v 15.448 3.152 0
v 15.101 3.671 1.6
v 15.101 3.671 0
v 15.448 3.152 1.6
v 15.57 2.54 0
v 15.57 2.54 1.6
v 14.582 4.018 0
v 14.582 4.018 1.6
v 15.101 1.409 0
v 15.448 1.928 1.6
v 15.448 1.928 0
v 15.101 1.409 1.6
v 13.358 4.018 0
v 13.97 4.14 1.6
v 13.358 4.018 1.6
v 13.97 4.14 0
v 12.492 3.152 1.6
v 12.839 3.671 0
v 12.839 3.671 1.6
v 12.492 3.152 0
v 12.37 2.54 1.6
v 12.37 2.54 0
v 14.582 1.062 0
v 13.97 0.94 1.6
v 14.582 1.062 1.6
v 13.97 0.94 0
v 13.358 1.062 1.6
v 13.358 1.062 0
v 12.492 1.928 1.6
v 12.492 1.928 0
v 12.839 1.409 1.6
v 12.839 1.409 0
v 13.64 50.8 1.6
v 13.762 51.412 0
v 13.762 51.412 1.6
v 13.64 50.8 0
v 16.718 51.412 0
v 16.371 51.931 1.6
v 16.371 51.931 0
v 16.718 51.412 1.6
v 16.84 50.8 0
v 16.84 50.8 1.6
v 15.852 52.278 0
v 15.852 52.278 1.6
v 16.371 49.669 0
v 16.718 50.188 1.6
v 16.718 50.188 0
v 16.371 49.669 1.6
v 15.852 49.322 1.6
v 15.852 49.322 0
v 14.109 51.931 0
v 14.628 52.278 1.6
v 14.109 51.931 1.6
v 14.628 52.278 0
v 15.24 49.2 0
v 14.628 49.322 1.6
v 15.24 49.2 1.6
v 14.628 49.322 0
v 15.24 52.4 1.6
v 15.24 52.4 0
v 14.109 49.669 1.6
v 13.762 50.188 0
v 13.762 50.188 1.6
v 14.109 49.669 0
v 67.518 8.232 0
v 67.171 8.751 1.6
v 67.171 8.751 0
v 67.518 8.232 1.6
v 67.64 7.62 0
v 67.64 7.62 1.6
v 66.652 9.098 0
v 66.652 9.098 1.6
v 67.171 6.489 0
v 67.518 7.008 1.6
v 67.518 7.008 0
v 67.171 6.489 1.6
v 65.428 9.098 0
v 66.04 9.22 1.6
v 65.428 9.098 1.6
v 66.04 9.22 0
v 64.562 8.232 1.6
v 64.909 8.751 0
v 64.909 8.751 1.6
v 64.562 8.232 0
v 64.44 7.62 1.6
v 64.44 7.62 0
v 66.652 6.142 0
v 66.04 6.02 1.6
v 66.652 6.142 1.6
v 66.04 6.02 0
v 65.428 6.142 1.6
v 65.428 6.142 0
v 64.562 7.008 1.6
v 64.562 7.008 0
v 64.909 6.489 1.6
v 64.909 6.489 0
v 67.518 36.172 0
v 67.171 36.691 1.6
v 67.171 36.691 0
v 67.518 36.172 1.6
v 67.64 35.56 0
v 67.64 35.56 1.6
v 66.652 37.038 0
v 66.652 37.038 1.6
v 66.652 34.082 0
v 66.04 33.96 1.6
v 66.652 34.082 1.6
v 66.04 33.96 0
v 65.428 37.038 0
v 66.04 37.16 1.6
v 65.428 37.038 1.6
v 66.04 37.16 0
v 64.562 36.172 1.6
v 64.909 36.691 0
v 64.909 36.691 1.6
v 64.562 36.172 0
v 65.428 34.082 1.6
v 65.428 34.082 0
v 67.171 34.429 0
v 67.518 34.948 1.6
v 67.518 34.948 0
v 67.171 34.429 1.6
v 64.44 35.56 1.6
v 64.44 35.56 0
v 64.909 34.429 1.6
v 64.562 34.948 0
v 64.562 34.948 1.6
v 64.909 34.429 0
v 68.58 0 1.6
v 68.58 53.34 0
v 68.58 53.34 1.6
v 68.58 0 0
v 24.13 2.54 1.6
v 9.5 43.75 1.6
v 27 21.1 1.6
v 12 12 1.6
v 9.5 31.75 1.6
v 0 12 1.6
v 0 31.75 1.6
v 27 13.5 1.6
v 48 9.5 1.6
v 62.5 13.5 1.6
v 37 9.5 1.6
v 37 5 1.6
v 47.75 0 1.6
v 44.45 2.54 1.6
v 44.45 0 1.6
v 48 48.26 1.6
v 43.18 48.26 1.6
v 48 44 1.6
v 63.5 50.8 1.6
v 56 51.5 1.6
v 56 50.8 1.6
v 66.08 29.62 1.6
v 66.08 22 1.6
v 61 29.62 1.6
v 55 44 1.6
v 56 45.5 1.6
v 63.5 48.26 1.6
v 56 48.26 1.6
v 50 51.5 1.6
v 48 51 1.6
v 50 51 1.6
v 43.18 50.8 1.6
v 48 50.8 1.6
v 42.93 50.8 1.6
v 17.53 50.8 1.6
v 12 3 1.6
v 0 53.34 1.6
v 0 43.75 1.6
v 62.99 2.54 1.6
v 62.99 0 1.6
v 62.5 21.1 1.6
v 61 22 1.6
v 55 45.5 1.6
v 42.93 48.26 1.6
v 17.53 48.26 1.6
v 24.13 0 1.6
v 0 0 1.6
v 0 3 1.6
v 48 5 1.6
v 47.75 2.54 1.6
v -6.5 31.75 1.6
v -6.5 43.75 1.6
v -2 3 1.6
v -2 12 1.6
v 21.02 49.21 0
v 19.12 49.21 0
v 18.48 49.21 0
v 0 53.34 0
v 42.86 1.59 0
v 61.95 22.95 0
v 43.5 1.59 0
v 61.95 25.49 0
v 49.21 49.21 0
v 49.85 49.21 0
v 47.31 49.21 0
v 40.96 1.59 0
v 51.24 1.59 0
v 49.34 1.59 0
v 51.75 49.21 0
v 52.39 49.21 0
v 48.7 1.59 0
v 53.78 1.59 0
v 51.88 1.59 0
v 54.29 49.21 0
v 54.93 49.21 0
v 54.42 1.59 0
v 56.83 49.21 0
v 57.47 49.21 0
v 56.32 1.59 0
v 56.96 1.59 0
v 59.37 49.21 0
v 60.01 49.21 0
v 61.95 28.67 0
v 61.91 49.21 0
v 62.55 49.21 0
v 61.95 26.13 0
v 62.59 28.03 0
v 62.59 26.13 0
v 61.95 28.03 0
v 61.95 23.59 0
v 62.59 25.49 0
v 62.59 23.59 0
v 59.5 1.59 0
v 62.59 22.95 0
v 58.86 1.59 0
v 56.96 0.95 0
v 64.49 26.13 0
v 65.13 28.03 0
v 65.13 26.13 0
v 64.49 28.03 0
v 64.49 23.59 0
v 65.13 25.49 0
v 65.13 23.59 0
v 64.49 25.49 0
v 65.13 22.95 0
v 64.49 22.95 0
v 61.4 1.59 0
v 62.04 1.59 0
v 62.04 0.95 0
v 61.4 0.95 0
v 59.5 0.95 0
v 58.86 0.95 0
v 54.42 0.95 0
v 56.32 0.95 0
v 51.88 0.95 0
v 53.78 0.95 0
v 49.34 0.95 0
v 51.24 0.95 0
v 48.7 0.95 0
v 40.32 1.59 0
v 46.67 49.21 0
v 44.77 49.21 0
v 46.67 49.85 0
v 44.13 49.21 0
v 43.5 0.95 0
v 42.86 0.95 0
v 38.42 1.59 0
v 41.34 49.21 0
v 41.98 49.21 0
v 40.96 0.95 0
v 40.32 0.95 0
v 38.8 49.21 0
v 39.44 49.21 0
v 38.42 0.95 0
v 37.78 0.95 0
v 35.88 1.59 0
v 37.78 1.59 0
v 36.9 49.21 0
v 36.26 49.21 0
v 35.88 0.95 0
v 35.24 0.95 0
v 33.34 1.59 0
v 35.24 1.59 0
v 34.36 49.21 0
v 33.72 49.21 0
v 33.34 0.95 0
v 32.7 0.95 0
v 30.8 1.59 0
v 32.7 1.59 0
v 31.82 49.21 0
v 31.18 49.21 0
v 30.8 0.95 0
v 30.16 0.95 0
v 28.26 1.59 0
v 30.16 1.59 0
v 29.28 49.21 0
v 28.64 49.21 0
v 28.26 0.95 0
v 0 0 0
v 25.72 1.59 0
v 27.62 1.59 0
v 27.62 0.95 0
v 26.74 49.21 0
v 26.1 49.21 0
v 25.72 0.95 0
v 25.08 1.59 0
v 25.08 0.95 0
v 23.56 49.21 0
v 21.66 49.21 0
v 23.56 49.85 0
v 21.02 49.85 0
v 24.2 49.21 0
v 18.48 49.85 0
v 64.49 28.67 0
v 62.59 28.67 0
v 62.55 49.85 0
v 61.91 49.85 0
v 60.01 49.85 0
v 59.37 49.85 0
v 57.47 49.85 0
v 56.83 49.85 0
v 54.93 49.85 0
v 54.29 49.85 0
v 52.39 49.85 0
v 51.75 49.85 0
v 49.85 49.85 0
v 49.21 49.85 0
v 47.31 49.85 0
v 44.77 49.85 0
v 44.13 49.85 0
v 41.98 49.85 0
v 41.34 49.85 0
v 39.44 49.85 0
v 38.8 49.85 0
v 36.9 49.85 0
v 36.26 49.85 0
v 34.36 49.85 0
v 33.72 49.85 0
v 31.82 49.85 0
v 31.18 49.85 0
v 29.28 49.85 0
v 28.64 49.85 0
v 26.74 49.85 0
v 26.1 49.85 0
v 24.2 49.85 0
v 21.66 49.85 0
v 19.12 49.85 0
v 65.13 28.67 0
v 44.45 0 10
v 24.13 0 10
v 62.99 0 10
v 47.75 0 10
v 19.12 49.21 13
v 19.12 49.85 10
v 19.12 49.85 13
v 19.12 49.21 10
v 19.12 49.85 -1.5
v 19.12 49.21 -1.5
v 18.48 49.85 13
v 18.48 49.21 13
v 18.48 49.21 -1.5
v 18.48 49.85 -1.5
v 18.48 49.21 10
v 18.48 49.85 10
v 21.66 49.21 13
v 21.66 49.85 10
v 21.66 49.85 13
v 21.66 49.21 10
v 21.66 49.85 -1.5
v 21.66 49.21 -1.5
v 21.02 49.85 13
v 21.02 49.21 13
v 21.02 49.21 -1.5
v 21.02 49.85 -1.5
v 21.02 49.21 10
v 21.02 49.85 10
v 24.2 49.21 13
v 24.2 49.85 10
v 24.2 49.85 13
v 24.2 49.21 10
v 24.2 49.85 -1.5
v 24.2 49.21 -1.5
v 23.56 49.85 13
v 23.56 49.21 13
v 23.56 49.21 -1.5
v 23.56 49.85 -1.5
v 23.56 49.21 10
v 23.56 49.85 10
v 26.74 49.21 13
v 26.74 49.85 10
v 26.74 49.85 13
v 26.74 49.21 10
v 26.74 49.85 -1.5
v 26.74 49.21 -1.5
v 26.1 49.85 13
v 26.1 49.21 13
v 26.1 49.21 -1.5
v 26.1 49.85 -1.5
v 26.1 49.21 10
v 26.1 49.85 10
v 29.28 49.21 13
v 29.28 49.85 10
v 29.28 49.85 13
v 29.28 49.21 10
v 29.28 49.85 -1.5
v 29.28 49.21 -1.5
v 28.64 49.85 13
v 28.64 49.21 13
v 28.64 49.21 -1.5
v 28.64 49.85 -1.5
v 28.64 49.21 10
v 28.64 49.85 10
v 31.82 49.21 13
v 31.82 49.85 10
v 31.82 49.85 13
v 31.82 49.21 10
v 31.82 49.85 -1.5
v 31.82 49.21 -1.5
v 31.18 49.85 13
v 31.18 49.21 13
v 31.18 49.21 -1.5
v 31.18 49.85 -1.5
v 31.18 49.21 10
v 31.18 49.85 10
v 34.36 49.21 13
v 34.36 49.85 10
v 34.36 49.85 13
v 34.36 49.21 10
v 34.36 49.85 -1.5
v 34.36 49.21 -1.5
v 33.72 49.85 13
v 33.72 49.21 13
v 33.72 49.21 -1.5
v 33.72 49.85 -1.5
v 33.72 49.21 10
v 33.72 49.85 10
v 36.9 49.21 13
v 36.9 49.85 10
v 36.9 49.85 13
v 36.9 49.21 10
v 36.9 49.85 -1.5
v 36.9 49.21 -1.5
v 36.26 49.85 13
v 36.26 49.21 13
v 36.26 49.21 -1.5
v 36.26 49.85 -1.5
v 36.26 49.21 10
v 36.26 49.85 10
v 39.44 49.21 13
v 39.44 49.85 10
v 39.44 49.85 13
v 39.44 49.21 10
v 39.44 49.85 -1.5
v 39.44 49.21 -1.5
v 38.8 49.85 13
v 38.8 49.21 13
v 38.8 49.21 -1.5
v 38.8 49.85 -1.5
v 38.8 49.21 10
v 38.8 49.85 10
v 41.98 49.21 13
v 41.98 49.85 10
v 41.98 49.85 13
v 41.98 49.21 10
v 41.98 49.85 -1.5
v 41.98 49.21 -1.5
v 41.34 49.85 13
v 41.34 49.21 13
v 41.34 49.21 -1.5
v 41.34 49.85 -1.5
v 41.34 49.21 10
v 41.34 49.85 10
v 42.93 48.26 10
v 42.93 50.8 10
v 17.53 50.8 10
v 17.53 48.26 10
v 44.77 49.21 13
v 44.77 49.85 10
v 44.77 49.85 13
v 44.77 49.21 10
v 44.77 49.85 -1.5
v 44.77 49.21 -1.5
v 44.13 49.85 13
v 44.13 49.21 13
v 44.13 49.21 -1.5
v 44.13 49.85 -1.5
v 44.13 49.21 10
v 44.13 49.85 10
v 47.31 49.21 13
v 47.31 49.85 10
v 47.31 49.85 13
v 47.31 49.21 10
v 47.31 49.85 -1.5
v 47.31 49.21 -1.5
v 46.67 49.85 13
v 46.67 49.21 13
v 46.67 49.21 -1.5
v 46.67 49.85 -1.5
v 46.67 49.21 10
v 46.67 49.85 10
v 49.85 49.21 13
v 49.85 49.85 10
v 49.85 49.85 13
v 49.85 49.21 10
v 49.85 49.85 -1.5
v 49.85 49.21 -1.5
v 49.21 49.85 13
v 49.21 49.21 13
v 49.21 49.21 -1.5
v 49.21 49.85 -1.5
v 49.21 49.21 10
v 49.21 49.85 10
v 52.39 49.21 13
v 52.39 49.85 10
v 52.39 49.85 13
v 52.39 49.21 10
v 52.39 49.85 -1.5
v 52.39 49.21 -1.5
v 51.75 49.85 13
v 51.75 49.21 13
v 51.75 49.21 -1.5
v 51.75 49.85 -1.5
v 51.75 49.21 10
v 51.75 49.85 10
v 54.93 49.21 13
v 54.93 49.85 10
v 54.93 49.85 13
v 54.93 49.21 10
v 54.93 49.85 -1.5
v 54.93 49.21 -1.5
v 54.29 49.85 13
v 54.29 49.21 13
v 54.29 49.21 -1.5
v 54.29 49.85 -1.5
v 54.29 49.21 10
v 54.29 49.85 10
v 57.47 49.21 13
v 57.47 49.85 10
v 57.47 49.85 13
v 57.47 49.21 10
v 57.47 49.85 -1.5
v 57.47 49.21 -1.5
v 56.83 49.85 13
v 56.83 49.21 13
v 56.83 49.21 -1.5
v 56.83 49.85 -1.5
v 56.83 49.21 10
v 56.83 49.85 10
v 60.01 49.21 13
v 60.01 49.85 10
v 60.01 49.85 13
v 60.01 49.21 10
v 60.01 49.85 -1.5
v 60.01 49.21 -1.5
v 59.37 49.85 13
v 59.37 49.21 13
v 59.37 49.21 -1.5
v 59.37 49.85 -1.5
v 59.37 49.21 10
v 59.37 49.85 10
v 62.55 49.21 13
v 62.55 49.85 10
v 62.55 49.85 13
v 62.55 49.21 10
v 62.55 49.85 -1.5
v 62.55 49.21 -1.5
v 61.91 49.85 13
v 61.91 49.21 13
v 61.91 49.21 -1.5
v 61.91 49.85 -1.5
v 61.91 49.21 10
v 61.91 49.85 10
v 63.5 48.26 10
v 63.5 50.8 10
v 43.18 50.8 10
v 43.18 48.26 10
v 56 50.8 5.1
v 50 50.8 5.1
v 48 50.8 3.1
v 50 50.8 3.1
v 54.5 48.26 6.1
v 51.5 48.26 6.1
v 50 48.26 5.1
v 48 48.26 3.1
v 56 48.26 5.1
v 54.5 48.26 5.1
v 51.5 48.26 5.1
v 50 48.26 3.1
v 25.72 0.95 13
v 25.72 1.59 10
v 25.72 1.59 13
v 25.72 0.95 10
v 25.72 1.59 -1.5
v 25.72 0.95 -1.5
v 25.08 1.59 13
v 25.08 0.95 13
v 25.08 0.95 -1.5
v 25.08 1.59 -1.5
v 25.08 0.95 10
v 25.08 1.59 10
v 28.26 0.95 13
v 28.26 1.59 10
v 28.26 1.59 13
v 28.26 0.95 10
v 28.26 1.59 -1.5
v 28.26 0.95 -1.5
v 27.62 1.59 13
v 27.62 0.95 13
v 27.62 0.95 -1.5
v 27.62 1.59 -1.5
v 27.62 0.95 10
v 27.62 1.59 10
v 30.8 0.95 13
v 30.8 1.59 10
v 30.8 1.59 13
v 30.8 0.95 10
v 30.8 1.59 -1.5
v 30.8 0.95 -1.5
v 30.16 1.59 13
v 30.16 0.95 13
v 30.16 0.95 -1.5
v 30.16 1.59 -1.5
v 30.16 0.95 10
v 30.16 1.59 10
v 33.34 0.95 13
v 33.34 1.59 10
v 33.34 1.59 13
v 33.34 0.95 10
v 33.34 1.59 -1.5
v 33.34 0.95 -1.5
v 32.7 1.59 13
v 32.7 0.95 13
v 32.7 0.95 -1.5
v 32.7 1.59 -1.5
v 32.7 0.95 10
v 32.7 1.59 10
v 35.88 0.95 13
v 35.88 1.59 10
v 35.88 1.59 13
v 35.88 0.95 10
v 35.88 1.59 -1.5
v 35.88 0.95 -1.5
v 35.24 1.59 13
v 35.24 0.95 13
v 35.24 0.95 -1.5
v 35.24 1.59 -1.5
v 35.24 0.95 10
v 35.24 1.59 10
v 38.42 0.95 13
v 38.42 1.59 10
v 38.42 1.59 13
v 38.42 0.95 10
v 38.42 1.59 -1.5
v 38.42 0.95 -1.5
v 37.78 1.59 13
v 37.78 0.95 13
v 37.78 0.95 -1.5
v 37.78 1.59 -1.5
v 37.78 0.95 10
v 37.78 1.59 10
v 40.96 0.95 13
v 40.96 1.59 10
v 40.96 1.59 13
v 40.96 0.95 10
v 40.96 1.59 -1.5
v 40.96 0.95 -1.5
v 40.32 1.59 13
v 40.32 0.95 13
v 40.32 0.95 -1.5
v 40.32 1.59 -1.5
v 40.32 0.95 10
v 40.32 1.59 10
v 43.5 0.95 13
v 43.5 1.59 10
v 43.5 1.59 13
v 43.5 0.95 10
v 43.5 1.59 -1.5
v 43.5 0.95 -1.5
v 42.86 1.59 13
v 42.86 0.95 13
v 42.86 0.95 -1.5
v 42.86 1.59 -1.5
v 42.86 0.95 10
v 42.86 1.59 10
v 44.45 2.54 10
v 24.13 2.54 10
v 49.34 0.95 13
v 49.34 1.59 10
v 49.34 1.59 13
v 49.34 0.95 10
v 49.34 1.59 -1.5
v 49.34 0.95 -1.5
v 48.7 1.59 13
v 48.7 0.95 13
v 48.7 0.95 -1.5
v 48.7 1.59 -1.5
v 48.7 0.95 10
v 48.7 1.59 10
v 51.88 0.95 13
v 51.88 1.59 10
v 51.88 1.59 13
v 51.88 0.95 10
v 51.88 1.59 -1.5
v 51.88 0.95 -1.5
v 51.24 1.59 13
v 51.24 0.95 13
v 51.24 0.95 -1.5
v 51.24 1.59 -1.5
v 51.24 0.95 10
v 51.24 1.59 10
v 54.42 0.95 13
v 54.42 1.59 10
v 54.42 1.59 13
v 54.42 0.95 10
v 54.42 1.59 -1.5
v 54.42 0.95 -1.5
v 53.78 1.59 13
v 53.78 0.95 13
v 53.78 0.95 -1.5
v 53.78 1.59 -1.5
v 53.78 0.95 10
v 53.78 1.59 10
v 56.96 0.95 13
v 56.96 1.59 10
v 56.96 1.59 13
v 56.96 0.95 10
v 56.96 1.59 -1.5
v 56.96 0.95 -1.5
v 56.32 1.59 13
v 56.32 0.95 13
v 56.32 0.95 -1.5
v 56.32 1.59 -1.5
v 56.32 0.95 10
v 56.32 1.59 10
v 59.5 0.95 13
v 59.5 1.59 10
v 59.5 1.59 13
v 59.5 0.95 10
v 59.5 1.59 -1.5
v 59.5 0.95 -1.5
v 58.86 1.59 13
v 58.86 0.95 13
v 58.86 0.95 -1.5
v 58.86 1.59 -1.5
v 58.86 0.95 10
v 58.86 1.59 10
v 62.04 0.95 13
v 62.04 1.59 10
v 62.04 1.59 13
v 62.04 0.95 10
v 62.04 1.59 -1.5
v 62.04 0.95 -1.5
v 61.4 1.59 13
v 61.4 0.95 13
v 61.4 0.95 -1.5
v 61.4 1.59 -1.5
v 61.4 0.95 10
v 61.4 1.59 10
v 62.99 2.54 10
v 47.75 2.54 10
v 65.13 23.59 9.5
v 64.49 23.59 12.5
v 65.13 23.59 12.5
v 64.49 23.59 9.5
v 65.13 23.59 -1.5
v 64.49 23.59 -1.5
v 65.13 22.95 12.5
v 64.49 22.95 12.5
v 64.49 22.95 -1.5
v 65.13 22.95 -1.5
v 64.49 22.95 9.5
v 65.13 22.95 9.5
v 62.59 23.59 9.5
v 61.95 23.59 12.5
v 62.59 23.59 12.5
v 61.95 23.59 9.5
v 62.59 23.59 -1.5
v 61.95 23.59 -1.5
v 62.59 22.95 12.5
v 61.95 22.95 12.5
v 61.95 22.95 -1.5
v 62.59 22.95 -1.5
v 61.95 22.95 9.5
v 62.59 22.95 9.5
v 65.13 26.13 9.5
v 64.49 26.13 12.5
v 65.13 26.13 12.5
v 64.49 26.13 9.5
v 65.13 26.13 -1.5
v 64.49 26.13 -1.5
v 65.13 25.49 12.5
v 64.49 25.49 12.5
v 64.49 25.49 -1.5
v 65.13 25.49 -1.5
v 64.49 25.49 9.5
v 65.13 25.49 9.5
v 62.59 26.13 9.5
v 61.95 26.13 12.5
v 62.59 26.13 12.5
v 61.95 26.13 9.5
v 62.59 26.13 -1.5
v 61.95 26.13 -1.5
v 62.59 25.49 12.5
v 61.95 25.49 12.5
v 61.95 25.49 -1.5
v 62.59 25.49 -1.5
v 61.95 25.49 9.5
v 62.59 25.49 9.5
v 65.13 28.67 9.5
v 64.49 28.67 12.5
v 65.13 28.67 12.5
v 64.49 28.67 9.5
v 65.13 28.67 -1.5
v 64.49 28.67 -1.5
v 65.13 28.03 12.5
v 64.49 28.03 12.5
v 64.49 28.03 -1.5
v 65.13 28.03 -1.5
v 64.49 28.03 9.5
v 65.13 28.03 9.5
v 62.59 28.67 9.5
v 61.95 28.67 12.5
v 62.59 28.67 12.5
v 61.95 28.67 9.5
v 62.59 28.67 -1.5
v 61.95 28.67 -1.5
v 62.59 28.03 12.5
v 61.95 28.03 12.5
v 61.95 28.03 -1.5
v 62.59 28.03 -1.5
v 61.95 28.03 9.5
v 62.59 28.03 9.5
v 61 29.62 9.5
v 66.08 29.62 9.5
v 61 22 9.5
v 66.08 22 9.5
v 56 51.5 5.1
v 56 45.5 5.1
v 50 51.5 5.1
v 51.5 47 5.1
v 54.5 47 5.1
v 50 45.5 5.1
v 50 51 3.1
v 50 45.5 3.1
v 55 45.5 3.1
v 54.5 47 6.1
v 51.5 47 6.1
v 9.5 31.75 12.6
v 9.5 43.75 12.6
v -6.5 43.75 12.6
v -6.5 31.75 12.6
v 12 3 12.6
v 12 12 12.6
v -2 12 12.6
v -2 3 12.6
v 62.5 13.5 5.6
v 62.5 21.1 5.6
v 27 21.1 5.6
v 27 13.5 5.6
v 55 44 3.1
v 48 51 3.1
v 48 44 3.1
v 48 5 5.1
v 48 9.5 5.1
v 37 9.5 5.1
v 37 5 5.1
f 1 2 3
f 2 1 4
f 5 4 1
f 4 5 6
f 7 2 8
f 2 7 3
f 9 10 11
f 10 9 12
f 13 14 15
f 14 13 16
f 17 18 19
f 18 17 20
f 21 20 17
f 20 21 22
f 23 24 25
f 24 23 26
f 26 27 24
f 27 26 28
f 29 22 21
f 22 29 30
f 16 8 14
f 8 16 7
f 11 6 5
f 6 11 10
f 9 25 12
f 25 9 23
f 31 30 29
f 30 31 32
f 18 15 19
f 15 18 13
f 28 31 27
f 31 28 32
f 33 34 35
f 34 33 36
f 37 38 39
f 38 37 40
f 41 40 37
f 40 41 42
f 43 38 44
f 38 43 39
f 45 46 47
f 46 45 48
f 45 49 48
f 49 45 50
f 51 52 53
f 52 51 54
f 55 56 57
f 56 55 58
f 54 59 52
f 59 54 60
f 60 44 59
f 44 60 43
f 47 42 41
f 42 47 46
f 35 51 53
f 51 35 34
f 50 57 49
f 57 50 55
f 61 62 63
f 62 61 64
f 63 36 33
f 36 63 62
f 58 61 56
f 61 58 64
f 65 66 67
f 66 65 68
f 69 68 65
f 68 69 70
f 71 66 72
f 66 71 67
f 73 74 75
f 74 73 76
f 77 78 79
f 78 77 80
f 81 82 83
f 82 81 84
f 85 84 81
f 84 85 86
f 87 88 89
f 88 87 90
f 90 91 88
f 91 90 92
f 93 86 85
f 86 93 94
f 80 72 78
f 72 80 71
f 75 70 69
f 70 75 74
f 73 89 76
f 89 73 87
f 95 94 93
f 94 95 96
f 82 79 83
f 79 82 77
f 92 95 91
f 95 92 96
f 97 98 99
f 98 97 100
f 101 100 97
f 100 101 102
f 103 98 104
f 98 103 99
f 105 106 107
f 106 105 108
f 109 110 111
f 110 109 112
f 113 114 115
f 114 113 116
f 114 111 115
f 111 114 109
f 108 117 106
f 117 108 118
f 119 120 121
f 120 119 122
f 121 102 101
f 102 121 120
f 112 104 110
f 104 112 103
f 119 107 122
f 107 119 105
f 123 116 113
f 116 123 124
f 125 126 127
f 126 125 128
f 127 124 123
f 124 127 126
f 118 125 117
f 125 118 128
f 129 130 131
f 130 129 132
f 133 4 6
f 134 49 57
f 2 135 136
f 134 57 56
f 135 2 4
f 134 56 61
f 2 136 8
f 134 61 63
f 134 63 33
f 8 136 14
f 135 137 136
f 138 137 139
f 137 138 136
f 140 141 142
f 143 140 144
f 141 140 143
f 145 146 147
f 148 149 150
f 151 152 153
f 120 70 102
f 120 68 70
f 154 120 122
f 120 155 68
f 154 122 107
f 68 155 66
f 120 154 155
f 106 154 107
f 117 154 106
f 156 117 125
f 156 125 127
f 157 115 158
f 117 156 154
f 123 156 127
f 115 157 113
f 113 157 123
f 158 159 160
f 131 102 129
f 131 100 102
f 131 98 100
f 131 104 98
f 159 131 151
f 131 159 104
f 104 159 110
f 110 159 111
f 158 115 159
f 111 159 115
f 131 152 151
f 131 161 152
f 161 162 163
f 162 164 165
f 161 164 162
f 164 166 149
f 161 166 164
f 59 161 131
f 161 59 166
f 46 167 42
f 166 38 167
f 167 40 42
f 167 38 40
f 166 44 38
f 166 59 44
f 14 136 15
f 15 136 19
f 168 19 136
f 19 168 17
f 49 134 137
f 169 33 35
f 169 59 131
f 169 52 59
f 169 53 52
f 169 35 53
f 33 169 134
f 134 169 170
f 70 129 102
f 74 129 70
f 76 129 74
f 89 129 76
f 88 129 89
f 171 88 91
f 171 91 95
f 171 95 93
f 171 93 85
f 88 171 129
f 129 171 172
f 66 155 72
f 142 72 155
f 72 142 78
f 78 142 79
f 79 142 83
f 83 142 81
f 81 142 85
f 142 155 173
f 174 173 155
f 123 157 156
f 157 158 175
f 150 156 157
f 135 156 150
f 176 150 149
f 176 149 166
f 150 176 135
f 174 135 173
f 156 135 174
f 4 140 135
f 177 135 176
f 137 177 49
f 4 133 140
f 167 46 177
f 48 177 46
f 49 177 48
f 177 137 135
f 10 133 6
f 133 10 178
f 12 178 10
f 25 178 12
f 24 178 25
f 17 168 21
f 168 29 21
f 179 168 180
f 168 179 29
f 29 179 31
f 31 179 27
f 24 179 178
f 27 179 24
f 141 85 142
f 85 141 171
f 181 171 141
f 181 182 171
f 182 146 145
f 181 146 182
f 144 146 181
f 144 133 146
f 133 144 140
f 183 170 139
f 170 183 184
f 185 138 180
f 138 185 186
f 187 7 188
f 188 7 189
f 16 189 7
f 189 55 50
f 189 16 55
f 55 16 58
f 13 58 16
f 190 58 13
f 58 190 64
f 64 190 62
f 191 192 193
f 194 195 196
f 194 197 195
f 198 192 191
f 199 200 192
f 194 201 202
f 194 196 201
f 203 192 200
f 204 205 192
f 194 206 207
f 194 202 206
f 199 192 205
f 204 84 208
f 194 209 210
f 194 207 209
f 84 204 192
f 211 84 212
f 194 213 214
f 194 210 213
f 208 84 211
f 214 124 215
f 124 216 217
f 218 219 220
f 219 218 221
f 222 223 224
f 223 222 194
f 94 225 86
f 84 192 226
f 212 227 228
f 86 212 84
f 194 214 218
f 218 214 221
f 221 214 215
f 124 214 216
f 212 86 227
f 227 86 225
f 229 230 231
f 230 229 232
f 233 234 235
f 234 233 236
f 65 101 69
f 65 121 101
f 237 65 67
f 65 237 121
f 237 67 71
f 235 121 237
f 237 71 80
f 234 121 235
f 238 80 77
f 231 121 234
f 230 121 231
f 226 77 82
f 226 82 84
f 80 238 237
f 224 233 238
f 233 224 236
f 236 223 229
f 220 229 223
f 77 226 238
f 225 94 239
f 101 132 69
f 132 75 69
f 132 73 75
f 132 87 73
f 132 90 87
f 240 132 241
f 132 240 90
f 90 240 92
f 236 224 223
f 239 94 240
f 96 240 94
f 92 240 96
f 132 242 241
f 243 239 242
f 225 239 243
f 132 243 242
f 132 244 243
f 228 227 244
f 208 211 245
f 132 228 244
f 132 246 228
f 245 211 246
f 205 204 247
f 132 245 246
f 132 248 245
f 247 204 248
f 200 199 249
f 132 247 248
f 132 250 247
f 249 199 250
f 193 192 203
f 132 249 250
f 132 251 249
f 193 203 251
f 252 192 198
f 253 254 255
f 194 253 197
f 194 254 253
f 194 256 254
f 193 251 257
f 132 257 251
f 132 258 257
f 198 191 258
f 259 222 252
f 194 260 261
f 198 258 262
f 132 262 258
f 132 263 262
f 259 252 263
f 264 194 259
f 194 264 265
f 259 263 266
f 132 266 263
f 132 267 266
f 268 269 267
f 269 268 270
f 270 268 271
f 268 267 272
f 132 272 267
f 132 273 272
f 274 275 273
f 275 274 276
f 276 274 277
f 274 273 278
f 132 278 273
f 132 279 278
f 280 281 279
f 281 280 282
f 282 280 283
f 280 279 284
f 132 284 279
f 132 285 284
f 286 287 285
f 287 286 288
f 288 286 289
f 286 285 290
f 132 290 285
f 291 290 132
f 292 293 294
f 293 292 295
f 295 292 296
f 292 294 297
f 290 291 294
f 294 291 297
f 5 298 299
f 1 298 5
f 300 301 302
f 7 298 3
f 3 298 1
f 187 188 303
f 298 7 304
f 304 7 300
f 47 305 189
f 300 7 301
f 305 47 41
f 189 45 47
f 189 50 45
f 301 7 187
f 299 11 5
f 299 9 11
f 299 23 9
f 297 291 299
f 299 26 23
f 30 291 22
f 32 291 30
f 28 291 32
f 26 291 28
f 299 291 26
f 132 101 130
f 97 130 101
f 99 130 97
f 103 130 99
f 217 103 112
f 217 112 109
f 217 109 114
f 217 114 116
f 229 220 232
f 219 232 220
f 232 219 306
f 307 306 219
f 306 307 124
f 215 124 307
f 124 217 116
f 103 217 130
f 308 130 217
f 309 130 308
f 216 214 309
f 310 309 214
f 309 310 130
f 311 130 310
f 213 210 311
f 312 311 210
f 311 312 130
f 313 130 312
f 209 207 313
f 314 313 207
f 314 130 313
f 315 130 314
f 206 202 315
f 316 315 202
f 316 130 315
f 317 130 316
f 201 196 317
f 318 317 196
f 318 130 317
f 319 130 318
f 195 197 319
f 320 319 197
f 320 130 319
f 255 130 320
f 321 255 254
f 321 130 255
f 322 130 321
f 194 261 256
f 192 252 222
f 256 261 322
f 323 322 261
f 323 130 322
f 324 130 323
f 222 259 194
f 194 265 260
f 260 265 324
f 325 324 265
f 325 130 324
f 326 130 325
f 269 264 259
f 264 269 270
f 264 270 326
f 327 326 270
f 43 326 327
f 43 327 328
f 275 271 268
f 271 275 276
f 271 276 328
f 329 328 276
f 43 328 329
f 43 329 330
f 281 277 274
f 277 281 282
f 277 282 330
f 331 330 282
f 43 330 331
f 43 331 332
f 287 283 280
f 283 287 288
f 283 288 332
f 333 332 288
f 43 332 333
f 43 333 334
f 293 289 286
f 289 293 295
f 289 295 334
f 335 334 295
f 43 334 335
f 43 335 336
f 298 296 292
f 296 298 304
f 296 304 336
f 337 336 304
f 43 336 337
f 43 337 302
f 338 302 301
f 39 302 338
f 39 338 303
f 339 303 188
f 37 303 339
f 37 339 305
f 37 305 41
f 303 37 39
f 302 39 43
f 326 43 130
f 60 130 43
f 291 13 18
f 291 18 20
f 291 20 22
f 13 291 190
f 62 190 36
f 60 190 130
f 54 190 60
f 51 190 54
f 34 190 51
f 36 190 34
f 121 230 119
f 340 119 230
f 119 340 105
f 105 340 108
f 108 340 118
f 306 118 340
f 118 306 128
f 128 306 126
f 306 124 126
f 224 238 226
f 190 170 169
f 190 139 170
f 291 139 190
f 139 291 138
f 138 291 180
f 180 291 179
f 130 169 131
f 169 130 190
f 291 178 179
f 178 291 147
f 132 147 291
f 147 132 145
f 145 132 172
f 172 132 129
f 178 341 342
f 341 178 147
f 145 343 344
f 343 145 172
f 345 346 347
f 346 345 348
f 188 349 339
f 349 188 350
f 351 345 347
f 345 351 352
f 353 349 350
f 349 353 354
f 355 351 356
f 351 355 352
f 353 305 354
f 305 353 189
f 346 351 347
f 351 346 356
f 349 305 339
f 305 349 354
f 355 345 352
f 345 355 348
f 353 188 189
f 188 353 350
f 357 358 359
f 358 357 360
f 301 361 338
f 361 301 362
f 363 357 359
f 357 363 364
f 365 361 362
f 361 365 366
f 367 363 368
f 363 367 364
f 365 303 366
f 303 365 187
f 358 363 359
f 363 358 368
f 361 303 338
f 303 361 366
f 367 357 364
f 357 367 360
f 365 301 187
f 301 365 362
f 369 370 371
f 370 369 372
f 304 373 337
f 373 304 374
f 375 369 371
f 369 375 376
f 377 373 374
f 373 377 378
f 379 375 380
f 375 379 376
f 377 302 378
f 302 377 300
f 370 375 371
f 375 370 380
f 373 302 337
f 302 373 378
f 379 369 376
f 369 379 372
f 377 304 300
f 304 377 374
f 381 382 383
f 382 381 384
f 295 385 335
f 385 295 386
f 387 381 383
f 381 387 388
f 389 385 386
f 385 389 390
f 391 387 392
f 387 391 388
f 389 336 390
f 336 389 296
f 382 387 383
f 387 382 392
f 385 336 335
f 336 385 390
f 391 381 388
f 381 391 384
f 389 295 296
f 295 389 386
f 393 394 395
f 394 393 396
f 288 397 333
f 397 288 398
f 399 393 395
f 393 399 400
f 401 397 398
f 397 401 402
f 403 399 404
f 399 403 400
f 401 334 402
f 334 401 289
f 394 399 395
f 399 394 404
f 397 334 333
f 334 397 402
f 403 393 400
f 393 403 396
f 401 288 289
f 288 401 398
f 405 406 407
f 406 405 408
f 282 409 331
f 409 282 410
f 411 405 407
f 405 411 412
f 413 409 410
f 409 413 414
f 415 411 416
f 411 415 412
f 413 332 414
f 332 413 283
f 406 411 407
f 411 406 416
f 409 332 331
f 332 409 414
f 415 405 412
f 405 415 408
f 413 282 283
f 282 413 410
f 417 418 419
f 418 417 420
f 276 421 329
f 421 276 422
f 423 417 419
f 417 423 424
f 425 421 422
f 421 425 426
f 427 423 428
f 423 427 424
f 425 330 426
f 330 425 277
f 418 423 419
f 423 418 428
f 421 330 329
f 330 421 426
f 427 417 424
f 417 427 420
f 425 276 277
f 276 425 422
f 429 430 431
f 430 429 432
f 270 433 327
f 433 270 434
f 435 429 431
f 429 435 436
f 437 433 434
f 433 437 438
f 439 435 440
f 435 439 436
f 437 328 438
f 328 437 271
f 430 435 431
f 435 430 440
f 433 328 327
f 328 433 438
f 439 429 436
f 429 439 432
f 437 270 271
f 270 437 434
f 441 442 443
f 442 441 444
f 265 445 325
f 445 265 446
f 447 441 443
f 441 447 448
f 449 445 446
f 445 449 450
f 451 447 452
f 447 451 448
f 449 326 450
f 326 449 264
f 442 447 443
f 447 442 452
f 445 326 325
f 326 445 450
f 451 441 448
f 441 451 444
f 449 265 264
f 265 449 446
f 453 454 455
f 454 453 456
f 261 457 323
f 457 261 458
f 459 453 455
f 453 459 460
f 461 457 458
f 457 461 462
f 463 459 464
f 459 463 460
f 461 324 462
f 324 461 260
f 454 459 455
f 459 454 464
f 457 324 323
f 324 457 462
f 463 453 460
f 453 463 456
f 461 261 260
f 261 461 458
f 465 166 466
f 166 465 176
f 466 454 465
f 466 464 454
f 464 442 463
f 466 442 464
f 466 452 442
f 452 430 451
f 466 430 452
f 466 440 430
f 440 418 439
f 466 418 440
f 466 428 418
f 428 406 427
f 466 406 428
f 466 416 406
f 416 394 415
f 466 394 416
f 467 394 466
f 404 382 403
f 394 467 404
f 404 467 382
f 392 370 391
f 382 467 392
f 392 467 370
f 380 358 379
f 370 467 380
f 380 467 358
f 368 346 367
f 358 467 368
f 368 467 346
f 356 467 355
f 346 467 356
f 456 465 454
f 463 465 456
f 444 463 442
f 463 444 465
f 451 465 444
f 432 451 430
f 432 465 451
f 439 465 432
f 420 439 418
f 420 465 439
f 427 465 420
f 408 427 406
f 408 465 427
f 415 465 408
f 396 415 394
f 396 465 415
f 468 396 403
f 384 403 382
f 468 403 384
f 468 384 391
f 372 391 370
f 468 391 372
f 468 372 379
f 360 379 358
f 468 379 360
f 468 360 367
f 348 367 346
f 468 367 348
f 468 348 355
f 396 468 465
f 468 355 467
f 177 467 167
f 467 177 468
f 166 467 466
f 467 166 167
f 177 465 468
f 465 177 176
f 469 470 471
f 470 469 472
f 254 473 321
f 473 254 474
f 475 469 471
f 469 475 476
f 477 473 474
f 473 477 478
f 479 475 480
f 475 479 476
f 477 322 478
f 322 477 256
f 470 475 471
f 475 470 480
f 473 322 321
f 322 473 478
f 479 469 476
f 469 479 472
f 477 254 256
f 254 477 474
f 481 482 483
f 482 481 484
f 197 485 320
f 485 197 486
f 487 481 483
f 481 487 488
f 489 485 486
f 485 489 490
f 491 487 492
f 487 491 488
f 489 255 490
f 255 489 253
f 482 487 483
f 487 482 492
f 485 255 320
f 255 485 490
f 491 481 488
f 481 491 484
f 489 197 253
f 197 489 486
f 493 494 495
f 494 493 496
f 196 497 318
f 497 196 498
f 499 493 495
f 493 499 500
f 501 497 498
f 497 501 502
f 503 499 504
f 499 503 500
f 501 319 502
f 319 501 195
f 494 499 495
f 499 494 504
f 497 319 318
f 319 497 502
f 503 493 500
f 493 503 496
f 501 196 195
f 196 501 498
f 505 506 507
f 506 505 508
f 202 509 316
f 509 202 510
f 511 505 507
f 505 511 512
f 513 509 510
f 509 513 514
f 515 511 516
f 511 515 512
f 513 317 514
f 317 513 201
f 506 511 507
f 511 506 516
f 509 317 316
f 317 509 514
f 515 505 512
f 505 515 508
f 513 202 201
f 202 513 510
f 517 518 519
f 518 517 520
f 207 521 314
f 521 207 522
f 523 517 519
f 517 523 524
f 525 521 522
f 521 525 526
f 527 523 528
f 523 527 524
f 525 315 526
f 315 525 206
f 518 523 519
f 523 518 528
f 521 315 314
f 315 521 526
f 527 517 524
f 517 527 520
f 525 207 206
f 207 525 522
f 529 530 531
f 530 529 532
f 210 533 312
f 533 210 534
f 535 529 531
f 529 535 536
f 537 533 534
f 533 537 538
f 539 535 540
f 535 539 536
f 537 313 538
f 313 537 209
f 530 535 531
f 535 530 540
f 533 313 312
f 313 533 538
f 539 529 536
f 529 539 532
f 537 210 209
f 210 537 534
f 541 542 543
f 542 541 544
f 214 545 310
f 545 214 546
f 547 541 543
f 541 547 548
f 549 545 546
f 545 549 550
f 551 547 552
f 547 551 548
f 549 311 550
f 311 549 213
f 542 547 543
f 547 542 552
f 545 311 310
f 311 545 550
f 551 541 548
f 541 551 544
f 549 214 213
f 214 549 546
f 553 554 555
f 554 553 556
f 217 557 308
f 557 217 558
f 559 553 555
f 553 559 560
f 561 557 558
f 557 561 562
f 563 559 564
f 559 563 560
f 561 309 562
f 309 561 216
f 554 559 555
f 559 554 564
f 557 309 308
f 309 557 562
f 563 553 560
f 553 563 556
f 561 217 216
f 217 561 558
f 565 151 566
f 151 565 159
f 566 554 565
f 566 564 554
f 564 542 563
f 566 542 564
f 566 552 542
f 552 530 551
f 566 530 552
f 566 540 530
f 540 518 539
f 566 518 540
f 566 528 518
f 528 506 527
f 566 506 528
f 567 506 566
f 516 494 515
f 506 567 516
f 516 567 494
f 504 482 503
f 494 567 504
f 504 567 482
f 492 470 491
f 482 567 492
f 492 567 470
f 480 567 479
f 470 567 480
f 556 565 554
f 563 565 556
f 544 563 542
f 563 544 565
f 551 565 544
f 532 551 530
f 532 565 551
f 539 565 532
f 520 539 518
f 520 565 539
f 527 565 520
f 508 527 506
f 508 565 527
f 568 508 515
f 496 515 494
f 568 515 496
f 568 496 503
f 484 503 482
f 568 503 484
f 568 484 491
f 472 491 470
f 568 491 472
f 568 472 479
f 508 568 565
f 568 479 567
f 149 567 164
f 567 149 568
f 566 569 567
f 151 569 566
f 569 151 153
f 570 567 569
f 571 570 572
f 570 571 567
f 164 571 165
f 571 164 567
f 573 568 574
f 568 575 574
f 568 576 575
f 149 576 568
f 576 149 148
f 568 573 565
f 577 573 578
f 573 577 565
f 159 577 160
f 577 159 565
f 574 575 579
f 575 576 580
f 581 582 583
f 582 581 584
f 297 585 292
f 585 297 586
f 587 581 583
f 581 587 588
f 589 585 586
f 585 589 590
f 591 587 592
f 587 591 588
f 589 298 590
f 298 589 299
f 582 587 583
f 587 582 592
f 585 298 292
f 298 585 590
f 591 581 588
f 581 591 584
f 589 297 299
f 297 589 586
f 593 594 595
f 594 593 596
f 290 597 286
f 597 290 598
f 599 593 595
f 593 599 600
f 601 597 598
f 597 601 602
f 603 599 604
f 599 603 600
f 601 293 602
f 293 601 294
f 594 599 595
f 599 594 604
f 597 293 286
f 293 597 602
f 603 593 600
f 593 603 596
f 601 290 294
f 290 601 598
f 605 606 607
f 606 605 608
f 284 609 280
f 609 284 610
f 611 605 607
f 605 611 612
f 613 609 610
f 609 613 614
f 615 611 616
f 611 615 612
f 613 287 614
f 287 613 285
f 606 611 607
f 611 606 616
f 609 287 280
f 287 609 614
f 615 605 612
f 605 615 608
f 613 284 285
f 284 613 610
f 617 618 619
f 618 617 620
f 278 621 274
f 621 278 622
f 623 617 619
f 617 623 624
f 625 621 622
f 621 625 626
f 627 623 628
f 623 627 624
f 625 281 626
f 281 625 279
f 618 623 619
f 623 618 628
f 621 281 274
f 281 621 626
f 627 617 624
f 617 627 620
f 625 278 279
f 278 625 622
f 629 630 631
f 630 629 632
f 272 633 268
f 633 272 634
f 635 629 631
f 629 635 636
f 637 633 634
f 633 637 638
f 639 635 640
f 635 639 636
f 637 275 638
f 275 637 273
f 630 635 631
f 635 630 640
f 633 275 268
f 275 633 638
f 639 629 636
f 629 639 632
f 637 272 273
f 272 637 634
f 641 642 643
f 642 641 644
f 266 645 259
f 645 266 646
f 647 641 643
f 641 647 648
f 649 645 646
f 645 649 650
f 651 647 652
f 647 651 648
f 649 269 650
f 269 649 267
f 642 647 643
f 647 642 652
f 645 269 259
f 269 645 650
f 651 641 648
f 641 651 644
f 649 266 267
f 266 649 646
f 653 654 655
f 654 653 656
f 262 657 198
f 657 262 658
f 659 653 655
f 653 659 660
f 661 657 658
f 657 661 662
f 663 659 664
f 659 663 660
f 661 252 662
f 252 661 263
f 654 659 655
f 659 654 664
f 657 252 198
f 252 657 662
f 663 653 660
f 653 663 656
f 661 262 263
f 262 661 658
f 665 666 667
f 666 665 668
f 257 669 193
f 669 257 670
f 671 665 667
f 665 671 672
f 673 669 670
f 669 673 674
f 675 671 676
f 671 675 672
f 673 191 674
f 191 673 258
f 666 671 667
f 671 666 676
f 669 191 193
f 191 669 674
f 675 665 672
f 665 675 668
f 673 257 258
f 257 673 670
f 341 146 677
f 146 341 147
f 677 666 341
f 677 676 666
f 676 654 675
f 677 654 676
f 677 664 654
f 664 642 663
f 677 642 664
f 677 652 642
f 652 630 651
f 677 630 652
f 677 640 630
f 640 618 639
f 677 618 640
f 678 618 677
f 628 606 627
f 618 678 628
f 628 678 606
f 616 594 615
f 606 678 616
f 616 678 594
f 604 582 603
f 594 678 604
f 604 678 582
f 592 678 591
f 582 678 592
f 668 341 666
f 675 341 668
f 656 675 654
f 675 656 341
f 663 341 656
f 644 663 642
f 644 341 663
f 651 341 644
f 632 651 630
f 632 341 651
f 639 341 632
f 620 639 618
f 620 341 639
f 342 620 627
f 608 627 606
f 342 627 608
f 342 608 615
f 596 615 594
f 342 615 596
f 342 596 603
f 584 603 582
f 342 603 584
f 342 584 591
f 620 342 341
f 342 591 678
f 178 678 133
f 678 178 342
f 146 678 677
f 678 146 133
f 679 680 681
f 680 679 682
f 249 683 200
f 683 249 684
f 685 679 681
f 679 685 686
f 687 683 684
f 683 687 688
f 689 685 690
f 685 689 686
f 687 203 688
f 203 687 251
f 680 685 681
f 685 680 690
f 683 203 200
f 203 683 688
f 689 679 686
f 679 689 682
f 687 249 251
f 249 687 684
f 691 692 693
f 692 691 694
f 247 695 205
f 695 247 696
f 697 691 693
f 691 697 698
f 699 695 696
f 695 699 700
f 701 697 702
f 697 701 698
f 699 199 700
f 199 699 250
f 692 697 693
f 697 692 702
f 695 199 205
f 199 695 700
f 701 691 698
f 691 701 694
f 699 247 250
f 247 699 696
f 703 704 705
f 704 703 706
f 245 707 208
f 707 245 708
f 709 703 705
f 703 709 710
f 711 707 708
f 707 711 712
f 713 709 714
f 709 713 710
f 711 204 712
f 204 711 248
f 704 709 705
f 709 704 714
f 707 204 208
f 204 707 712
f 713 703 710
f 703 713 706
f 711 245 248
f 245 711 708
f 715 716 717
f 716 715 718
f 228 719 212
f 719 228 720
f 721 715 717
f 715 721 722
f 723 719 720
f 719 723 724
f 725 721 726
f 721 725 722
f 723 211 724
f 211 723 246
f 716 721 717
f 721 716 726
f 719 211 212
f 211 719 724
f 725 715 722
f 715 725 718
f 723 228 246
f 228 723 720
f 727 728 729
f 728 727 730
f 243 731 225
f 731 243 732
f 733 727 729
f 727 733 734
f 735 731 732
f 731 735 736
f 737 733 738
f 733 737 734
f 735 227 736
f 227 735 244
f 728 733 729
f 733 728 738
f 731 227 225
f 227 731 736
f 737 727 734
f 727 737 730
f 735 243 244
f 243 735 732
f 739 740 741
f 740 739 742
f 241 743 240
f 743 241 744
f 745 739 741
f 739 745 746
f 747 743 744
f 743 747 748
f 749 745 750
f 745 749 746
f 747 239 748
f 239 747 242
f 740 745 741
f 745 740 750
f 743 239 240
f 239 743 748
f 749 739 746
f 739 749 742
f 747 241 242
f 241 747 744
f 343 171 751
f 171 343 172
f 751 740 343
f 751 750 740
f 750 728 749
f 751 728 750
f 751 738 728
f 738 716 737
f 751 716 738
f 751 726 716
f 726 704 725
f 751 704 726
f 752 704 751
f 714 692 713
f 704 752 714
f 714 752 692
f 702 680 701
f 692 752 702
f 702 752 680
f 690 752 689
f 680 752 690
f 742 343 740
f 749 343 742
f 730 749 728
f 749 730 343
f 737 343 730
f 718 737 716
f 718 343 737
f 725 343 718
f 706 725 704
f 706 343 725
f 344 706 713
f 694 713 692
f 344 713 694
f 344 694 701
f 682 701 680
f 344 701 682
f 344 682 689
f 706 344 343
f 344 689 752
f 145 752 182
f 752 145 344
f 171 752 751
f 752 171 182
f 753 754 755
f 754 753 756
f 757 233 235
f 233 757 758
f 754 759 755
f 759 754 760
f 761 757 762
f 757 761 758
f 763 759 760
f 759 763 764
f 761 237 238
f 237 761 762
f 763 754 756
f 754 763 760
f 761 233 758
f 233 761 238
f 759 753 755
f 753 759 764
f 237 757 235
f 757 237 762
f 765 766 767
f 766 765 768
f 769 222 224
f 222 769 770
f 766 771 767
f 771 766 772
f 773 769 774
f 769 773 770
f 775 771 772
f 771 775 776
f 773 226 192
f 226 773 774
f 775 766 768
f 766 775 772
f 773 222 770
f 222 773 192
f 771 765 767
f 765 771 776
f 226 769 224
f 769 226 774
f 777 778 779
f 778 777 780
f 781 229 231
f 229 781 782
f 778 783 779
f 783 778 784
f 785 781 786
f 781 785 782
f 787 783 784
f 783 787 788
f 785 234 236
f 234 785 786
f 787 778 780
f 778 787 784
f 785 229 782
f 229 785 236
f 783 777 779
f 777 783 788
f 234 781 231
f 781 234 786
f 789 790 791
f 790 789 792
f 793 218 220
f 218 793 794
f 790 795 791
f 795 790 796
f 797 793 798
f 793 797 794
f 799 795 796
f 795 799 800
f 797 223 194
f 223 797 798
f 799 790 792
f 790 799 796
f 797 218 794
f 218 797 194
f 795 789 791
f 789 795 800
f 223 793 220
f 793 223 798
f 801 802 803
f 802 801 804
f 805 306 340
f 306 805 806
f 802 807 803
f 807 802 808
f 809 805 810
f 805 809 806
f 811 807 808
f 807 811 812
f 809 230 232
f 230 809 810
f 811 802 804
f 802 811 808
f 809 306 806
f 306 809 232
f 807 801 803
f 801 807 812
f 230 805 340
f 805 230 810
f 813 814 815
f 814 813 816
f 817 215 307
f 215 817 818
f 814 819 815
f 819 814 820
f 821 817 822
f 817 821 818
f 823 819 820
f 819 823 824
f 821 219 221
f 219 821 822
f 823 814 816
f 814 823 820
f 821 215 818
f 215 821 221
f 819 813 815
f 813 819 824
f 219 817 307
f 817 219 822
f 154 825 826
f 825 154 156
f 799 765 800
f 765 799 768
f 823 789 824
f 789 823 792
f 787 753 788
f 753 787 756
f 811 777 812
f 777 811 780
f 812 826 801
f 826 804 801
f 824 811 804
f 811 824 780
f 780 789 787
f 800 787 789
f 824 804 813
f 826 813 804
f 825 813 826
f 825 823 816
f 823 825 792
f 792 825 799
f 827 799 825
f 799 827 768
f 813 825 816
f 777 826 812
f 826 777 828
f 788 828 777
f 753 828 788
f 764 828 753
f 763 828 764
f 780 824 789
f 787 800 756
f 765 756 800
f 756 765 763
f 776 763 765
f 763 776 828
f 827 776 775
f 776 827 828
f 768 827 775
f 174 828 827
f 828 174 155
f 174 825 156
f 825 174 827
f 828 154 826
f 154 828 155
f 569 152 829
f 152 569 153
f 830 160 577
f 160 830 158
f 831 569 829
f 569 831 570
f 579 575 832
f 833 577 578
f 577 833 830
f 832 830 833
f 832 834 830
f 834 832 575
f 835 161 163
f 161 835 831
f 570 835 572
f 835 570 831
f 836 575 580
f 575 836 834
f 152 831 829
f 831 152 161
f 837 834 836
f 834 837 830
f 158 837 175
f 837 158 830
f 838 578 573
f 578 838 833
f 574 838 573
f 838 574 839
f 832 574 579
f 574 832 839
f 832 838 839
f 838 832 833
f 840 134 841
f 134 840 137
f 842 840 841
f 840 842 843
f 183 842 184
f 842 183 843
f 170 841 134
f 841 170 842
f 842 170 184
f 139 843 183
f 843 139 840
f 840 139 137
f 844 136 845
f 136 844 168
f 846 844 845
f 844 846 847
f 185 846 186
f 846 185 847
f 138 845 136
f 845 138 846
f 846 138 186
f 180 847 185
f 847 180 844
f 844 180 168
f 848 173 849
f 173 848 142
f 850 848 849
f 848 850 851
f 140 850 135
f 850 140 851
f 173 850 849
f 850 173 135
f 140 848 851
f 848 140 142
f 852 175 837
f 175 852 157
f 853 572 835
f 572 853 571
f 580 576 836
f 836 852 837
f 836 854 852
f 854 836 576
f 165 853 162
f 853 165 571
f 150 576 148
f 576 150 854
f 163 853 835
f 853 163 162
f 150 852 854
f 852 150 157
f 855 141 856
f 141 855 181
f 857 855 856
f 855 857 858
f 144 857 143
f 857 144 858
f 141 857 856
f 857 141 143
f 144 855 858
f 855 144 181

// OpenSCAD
// file: ../board_common.scad
// What every board model here is made of: a PCB with holes, pin headers,
// chips and jacks, drawn from published dimensions. Nothing here is anyone's
// mesh; a board's outline, hole positions and connector placements are
// specifications the makers publish so that cases and shields can be made.
//
// Every board's origin is its PCB's front-left bottom corner (x right, y back,
// z up), with the PCB lying flat on z = 0 -- so a board placed at a node in
// a site sits on that node's floor, which is where a board sits on a bench.

pcb_t = 1.6;
pitch = 2.54;

module pcb(size, holes = [], hole_d = 3.2, col = "darkgreen") {
    color(col) difference() {
        cube([size.x, size.y, pcb_t]);
        for (h = holes) translate([h.x, h.y, -1]) cylinder(d = hole_d, h = pcb_t + 2, $fn = 16);
    }
}

// Pins are square posts that overlap what they stand in. OpenSCAD 2021.01
// exports a union with hexagonal pins, or with parts that only touch along
// an edge, as a mesh that is not closed -- and then drops it from any later
// union, silently. Every part here overlaps its neighbour by a little.
pin = 0.64;

// a row of `n` pins at the given start, along +x (or +y when `along_y`), with plastic bodies
module header(n, at, along_y = false, rows = 1, h = 8.5) {
    translate([at.x, at.y, pcb_t - 0.1]) rotate([0, 0, along_y ? 90 : 0]) translate([0, along_y ? -rows * pitch : 0, 0]) {
        color("black") cube([n * pitch, rows * pitch, h]);
        color("gold") for (i = [0 : n - 1]) for (r = [0 : rows - 1])
            translate([i * pitch + pitch / 2 - pin / 2, r * pitch + pitch / 2 - pin / 2, -3]) cube([pin, pin, h + 6]);
    }
}

// a row of `n` bare pins pointing down (a devkit standing on a breadboard).
// The pins are one gold strip, not n posts: n posts through a plastic bar
// under a PCB is a face with n holes, which OpenSCAD 2021.01 exports as a
// mesh CGAL will not read back. At bench scale a strip is a row of pins.
module pins_down(n, at, along_y = false, len = 11) {
    // one translate per solid, from the board's own frame: a chain of
    // translates with negative offsets rounds differently and the exporter
    // then writes a mesh CGAL will not read back (seen; not understood)
    rotate([0, 0, along_y ? 90 : 0]) {
        color("black") translate([at.x, at.y - pitch / 2, pcb_t - pitch]) cube([n * pitch, pitch, pitch + 0.1]);
        color("gold") translate([at.x + pitch / 2 - pin / 2, at.y - pin / 2, -len]) cube([(n - 1) * pitch + pin, pin, len + pcb_t - pitch + 0.2]);
    }
}

module chip(size, at, col = "black") { color(col) translate([at.x, at.y, pcb_t - 0.1]) cube([size.x, size.y, size.z + 0.1]); }

module usb_b(at) {           // a full-size USB-B jack, its face at the -x side
    color("silver") translate([at.x, at.y, pcb_t]) cube([16, 12, 11]);
}
module barrel_jack(at) {     // a 2.1 mm DC jack, its face at the -x side
    color("black") translate([at.x, at.y, pcb_t]) cube([14, 9, 11]);
}
module micro_usb(at, along_y = false) {
    color("silver") translate([at.x, at.y, pcb_t]) cube(along_y ? [8, 6, 3] : [6, 8, 3]);
}
module usb_c(at) { color("silver") translate([at.x, at.y, pcb_t]) cube([9, 7.5, 3.2]); }
module usb_a_stack(at) {     // two USB-A ports one above the other, the face at +x
    color("silver") translate([at.x, at.y, pcb_t]) cube([17.5, 13.2, 16]);
}
module rj45(at) { color("silver") translate([at.x, at.y, pcb_t]) cube([21.5, 16, 13.5]); }
module button(at) { color("silver") translate([at.x, at.y, pcb_t - 0.1]) cube([6, 6, 3.6]); color("black") translate([at.x + 1.5, at.y + 1.5, pcb_t + 3.4]) cube([3, 3, 1.1]); }
module crystal(at) { color("silver") translate([at.x, at.y, pcb_t]) cube([11, 4.5, 3.5]); }
module heatsink(at, size = [9, 9, 8]) { color("black") translate([at.x, at.y, pcb_t - 0.1]) cube([size.x, size.y, size.z + 4.1]); }
module screw_terminal(n, at, along_y = false) {
    translate([at.x, at.y, pcb_t]) rotate([0, 0, along_y ? 90 : 0]) color("mediumblue") cube([n * 5.08, 8, 10]);
}
module jst(n, at, along_y = false) {   // a JST-XH style header
    translate([at.x, at.y, pcb_t]) rotate([0, 0, along_y ? 90 : 0]) color("ivory") cube([n * 2.5 + 2.4, 5.8, 7]);
}
module sd_slot(at) { color("silver") translate([at.x, at.y, pcb_t]) cube([26, 28, 3]); }
// main file
// Arduino Uno R3, from the published board drawing: a 68.58 x 53.34 mm PCB
// (2.7 x 2.1 in) with four mounting holes, the USB-B jack and the barrel jack
// on the left edge, the digital headers along the back edge, the power and
// analog headers along the front, the ATmega328P in its DIP socket, the ICSP
// header at the right edge. Hole positions are the standard ones every Uno
// shield and case is made to.

include <../board_common.scad>

size = [68.58, 53.34];
holes = [[13.97, 2.54], [15.24, 50.8], [66.04, 7.62], [66.04, 35.56]];

module arduino_uno() {
    pcb(size, holes, col = "teal");
    usb_b([-6.5, 31.75]);          // overhangs the left edge by 6.5
    barrel_jack([-2, 3]);
    header(10, [17.53, 50.8 - pitch]);      // D8..D13, GND, AREF, SDA, SCL
    header(8, [43.18, 50.8 - pitch]);       // D0..D7
    header(8, [24.13, 0]);                  // power
    header(6, [47.75, 0]);                  // A0..A5
    chip([35.5, 7.6, 4], [27, 13.5]);       // the ATmega328P, DIP-28, in its socket
    chip([7, 7, 1.5], [48, 44], "dimgray"); // the ATmega16U2 (USB)
    header(3, [61, 22], along_y = true, rows = 2, h = 8);   // ICSP
    button([50, 45.5]);
    crystal([37, 5]);
}

arduino_uno();
